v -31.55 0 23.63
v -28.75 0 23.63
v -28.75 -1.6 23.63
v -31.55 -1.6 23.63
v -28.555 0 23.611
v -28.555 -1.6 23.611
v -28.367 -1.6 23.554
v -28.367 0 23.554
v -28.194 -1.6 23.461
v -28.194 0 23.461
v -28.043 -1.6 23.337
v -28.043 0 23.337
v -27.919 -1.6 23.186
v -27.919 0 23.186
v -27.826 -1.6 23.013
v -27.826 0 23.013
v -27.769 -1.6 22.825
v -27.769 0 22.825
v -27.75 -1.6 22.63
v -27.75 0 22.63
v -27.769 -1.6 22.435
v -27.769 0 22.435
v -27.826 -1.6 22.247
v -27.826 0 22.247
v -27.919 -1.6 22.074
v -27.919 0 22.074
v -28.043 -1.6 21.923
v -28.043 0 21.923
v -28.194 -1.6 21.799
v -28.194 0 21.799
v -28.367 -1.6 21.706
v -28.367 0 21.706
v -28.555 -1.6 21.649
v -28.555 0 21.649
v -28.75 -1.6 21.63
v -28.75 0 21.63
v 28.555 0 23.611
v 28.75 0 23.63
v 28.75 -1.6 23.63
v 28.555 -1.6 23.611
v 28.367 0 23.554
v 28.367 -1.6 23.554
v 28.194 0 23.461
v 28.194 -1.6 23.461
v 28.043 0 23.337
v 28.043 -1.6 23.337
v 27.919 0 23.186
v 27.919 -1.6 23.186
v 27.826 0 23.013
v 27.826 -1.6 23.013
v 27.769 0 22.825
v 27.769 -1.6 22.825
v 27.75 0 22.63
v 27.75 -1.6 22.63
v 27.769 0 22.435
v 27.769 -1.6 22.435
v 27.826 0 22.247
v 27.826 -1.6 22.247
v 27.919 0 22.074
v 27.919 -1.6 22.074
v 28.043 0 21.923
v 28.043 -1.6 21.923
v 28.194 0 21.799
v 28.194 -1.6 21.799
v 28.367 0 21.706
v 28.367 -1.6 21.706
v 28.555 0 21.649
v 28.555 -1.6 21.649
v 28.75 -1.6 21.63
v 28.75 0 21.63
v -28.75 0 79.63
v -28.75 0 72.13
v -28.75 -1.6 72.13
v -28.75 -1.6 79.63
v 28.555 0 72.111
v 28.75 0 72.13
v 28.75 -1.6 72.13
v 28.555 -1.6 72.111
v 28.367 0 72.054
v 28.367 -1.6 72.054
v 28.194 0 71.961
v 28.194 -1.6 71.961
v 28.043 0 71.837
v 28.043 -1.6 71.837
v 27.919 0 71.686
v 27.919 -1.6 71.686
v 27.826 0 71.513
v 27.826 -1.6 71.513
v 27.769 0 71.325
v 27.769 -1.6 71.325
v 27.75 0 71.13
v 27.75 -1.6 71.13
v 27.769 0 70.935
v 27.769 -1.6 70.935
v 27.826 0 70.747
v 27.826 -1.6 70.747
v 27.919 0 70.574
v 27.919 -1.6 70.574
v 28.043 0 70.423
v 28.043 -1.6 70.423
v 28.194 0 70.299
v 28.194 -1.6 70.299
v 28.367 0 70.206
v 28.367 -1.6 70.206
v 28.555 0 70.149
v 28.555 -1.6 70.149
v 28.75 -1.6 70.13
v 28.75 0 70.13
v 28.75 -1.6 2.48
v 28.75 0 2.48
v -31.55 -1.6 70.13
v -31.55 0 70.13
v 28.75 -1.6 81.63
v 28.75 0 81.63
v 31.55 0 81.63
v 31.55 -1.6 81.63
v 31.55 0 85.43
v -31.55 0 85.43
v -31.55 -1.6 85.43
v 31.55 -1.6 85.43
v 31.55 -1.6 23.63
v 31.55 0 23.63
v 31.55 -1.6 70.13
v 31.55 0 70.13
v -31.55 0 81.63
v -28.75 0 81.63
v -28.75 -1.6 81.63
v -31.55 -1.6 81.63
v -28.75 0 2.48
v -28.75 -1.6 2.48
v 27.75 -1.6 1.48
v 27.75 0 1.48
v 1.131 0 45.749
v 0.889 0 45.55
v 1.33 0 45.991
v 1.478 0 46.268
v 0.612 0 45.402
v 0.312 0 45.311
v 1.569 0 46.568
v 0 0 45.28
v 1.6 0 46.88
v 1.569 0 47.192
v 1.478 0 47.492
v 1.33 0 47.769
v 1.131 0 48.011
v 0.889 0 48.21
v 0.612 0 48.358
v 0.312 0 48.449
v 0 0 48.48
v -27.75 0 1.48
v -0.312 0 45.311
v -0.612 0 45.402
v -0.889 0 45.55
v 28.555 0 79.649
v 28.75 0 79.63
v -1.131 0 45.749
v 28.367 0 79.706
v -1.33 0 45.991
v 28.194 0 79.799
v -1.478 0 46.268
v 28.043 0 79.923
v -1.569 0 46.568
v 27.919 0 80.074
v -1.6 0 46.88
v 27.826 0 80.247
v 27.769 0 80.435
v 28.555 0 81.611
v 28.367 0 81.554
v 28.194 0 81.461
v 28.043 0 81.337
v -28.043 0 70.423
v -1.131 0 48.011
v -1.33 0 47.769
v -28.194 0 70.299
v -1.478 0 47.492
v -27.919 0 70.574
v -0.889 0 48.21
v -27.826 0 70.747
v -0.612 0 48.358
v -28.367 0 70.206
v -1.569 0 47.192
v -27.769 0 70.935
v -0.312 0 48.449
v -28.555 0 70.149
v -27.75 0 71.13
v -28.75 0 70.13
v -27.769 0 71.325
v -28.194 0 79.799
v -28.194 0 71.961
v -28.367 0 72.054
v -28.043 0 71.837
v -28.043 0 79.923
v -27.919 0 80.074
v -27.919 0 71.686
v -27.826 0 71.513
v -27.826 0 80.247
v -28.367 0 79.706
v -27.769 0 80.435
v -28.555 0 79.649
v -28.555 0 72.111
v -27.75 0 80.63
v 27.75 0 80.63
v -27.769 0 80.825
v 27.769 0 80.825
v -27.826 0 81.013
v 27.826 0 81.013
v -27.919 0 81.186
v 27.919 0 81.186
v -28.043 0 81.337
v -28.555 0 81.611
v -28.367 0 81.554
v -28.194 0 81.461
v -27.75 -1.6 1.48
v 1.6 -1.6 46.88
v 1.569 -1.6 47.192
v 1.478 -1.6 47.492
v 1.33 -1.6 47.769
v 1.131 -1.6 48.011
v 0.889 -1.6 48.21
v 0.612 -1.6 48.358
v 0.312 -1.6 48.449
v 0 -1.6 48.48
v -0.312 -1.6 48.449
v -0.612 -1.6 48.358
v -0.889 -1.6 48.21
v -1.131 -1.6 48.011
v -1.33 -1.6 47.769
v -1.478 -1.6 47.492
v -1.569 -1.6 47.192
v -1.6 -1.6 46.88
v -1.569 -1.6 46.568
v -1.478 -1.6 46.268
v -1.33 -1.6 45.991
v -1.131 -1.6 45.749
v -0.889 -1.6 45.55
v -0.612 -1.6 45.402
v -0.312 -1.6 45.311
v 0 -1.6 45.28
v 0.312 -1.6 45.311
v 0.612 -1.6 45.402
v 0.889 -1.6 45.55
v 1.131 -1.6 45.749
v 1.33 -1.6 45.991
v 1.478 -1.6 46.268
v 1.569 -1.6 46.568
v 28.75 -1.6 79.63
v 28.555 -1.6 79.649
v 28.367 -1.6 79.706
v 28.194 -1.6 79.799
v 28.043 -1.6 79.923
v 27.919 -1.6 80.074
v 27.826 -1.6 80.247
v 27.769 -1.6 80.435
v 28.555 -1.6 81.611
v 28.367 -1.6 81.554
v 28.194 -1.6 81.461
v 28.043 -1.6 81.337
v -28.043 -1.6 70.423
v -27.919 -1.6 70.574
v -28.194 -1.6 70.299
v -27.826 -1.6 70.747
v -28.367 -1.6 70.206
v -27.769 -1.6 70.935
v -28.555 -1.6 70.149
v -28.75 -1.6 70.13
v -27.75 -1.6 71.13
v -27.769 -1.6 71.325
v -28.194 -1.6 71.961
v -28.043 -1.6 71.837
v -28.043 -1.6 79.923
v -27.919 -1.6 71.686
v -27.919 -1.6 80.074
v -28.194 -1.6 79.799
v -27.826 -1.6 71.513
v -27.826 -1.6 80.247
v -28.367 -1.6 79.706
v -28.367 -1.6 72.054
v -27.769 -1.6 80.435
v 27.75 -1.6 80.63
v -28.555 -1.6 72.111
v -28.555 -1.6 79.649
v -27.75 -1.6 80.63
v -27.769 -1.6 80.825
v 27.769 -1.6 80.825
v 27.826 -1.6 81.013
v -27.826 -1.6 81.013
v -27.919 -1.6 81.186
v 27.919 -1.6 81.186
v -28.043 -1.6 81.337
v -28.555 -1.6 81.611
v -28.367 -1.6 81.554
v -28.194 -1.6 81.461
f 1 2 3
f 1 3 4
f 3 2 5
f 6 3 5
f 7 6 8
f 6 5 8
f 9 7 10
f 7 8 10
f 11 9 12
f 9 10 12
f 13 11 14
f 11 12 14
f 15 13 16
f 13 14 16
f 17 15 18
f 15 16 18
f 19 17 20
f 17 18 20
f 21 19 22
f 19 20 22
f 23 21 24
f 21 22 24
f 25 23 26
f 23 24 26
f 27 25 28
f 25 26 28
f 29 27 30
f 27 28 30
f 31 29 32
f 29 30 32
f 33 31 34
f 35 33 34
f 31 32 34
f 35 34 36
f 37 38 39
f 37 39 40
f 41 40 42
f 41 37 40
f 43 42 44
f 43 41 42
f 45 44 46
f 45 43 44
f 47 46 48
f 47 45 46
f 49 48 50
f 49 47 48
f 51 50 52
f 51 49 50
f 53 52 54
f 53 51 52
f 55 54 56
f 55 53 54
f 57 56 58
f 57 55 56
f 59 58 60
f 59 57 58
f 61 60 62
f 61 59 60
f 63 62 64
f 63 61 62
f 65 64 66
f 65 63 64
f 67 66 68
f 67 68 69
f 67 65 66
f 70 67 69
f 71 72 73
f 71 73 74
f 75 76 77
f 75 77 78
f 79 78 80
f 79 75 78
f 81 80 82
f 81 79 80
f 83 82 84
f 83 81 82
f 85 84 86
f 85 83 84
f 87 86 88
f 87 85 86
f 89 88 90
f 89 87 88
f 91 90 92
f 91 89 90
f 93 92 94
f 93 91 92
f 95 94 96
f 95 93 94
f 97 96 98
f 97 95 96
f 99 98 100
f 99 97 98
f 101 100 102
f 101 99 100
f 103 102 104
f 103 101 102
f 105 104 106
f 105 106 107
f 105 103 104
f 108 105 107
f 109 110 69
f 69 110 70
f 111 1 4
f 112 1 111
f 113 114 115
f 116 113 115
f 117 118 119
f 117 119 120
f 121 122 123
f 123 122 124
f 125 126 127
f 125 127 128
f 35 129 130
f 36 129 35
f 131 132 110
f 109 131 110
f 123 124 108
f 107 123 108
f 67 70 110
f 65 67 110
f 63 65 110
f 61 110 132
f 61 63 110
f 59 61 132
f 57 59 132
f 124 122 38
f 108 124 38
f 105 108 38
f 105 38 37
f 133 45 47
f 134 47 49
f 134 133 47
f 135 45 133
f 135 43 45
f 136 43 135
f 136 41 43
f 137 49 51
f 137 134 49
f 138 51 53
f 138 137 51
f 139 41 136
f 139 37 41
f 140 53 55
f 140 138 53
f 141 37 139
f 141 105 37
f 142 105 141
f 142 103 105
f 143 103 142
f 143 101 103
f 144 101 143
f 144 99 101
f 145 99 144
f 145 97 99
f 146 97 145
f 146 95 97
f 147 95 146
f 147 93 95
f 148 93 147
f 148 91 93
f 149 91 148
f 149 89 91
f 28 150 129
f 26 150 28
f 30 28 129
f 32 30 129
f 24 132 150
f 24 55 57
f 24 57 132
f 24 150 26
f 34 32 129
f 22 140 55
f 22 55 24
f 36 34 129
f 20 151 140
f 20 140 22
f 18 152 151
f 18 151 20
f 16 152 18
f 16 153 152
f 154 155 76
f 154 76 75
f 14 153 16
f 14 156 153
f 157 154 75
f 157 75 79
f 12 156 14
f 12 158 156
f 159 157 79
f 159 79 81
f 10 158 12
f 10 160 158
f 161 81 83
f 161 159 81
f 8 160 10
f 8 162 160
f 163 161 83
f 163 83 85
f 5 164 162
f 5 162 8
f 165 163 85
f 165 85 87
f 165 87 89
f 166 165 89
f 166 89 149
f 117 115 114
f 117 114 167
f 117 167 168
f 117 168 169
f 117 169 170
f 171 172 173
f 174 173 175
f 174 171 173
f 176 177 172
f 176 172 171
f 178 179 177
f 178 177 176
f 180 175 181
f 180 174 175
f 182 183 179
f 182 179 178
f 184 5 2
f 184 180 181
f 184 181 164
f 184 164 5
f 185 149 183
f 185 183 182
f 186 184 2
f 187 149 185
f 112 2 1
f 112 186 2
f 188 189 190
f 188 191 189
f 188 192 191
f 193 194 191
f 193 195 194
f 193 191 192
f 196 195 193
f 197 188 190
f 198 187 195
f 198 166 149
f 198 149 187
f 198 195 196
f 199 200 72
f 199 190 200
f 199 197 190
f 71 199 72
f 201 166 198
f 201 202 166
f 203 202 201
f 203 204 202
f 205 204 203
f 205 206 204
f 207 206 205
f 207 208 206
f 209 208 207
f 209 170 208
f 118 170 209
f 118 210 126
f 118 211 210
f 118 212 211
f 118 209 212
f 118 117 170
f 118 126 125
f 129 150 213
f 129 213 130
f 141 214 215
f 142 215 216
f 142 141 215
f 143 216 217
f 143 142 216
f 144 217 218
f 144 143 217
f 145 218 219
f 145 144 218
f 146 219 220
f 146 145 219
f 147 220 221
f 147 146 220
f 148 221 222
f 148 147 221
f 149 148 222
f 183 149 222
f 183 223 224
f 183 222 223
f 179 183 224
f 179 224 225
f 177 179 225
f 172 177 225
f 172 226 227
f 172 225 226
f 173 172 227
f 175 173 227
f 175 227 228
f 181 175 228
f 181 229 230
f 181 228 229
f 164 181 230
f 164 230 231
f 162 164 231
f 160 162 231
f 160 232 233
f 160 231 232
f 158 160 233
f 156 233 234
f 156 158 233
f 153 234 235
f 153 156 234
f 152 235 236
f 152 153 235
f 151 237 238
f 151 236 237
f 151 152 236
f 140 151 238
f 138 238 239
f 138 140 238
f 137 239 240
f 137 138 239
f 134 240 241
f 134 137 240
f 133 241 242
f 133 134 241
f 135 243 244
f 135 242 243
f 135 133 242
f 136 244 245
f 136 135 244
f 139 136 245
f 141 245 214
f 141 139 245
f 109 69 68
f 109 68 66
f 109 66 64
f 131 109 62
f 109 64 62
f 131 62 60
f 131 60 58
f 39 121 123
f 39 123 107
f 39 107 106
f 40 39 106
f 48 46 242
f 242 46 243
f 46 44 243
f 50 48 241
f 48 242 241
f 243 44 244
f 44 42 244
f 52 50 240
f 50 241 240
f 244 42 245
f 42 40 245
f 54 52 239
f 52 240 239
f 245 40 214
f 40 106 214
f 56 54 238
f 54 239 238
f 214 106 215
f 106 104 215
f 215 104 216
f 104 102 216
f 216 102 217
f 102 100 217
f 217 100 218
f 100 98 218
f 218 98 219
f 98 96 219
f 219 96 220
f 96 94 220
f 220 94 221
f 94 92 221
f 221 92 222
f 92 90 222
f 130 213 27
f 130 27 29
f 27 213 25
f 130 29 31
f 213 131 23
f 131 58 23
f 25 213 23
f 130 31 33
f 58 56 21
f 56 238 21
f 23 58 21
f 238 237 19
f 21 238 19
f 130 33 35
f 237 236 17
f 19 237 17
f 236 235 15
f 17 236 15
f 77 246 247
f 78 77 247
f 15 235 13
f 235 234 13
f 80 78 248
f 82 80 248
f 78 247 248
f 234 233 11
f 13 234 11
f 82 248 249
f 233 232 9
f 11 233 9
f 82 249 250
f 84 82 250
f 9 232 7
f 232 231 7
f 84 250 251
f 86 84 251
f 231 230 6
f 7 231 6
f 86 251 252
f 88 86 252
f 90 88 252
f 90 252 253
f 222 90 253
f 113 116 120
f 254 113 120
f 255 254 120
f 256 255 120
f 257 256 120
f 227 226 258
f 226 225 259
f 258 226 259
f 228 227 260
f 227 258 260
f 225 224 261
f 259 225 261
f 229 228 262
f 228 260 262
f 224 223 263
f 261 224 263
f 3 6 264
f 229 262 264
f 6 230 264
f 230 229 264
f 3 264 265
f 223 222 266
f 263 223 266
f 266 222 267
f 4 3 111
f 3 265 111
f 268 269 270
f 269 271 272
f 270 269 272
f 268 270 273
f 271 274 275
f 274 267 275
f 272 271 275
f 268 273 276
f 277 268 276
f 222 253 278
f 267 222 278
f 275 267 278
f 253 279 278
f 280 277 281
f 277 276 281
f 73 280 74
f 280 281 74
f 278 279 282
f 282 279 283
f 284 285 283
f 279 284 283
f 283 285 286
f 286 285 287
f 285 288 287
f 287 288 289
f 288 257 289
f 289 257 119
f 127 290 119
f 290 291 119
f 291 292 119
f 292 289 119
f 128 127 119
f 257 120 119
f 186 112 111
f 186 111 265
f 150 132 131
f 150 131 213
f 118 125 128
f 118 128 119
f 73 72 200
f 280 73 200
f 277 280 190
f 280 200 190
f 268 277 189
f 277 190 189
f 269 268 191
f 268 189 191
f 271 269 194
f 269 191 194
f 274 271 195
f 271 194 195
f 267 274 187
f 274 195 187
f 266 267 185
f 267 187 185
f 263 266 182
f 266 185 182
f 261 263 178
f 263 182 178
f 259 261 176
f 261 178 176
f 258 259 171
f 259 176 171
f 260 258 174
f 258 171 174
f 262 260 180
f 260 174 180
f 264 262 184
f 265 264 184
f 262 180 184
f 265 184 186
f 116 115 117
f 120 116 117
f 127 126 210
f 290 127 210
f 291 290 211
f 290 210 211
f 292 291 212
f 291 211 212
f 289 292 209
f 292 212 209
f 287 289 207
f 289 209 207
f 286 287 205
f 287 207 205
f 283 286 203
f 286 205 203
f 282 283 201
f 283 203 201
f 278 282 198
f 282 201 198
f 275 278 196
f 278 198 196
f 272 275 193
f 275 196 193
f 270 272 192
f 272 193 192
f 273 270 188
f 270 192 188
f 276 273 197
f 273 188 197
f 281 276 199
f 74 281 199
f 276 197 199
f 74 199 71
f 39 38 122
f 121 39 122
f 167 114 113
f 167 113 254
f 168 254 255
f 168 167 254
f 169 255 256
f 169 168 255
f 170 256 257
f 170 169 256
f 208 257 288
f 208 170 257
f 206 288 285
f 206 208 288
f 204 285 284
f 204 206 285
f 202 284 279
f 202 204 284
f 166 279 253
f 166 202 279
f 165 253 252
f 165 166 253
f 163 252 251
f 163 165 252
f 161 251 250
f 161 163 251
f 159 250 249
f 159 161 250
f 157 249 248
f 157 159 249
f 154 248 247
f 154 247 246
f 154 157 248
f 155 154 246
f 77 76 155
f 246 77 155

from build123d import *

# Parameters (mm, degrees)
PAD009_DEPTH    = 1.6
SKETCH029_R     = 1.6
POCKET014_DEPTH = 1.601


with BuildPart() as part:
    # Sketch028 → Pad009 (new body)
    with BuildSketch(Plane.XZ):
        with BuildLine():
            Line((0, 1.48), (27.75, 1.48))
            Line((27.75, 1.48), (28.75, 2.48))
            Line((28.75, 2.48), (28.75, 21.63))
            ThreePointArc((28.75, 23.63), (27.75, 22.63), (28.75, 21.63))
            Line((28.75, 23.63), (31.55, 23.63))
            Line((31.55, 23.63), (31.55, 70.13))
            Line((31.55, 70.13), (28.75, 70.13))
            ThreePointArc((28.75, 72.13), (27.75, 71.13), (28.75, 70.13))
            Line((28.75, 72.13), (28.75, 79.63))
            ThreePointArc((28.75, 81.63), (27.75, 80.63), (28.75, 79.63))
            Line((28.75, 81.63), (31.55, 81.63))
            Line((31.55, 81.63), (31.55, 85.43))
            Line((31.55, 85.43), (0, 85.43))
            Line((0, 85.43), (0, 1.48))
        make_face()
    pad009 = extrude(amount=PAD009_DEPTH)

    # Mirrored002: Pad009 across Sketch028 V_Axis
    add(pad009.mirror(Plane(origin=(0, 0, 0), x_dir=(0, -1, 0), z_dir=(1, 0, 0))))

    # Sketch029 → Pocket014 (cut, through all)
    with BuildSketch(Plane.XZ):
        with Locations((0, 46.88)):
            Circle(SKETCH029_R)
    extrude(amount=POCKET014_DEPTH, mode=Mode.SUBTRACT)


solid = part.part
